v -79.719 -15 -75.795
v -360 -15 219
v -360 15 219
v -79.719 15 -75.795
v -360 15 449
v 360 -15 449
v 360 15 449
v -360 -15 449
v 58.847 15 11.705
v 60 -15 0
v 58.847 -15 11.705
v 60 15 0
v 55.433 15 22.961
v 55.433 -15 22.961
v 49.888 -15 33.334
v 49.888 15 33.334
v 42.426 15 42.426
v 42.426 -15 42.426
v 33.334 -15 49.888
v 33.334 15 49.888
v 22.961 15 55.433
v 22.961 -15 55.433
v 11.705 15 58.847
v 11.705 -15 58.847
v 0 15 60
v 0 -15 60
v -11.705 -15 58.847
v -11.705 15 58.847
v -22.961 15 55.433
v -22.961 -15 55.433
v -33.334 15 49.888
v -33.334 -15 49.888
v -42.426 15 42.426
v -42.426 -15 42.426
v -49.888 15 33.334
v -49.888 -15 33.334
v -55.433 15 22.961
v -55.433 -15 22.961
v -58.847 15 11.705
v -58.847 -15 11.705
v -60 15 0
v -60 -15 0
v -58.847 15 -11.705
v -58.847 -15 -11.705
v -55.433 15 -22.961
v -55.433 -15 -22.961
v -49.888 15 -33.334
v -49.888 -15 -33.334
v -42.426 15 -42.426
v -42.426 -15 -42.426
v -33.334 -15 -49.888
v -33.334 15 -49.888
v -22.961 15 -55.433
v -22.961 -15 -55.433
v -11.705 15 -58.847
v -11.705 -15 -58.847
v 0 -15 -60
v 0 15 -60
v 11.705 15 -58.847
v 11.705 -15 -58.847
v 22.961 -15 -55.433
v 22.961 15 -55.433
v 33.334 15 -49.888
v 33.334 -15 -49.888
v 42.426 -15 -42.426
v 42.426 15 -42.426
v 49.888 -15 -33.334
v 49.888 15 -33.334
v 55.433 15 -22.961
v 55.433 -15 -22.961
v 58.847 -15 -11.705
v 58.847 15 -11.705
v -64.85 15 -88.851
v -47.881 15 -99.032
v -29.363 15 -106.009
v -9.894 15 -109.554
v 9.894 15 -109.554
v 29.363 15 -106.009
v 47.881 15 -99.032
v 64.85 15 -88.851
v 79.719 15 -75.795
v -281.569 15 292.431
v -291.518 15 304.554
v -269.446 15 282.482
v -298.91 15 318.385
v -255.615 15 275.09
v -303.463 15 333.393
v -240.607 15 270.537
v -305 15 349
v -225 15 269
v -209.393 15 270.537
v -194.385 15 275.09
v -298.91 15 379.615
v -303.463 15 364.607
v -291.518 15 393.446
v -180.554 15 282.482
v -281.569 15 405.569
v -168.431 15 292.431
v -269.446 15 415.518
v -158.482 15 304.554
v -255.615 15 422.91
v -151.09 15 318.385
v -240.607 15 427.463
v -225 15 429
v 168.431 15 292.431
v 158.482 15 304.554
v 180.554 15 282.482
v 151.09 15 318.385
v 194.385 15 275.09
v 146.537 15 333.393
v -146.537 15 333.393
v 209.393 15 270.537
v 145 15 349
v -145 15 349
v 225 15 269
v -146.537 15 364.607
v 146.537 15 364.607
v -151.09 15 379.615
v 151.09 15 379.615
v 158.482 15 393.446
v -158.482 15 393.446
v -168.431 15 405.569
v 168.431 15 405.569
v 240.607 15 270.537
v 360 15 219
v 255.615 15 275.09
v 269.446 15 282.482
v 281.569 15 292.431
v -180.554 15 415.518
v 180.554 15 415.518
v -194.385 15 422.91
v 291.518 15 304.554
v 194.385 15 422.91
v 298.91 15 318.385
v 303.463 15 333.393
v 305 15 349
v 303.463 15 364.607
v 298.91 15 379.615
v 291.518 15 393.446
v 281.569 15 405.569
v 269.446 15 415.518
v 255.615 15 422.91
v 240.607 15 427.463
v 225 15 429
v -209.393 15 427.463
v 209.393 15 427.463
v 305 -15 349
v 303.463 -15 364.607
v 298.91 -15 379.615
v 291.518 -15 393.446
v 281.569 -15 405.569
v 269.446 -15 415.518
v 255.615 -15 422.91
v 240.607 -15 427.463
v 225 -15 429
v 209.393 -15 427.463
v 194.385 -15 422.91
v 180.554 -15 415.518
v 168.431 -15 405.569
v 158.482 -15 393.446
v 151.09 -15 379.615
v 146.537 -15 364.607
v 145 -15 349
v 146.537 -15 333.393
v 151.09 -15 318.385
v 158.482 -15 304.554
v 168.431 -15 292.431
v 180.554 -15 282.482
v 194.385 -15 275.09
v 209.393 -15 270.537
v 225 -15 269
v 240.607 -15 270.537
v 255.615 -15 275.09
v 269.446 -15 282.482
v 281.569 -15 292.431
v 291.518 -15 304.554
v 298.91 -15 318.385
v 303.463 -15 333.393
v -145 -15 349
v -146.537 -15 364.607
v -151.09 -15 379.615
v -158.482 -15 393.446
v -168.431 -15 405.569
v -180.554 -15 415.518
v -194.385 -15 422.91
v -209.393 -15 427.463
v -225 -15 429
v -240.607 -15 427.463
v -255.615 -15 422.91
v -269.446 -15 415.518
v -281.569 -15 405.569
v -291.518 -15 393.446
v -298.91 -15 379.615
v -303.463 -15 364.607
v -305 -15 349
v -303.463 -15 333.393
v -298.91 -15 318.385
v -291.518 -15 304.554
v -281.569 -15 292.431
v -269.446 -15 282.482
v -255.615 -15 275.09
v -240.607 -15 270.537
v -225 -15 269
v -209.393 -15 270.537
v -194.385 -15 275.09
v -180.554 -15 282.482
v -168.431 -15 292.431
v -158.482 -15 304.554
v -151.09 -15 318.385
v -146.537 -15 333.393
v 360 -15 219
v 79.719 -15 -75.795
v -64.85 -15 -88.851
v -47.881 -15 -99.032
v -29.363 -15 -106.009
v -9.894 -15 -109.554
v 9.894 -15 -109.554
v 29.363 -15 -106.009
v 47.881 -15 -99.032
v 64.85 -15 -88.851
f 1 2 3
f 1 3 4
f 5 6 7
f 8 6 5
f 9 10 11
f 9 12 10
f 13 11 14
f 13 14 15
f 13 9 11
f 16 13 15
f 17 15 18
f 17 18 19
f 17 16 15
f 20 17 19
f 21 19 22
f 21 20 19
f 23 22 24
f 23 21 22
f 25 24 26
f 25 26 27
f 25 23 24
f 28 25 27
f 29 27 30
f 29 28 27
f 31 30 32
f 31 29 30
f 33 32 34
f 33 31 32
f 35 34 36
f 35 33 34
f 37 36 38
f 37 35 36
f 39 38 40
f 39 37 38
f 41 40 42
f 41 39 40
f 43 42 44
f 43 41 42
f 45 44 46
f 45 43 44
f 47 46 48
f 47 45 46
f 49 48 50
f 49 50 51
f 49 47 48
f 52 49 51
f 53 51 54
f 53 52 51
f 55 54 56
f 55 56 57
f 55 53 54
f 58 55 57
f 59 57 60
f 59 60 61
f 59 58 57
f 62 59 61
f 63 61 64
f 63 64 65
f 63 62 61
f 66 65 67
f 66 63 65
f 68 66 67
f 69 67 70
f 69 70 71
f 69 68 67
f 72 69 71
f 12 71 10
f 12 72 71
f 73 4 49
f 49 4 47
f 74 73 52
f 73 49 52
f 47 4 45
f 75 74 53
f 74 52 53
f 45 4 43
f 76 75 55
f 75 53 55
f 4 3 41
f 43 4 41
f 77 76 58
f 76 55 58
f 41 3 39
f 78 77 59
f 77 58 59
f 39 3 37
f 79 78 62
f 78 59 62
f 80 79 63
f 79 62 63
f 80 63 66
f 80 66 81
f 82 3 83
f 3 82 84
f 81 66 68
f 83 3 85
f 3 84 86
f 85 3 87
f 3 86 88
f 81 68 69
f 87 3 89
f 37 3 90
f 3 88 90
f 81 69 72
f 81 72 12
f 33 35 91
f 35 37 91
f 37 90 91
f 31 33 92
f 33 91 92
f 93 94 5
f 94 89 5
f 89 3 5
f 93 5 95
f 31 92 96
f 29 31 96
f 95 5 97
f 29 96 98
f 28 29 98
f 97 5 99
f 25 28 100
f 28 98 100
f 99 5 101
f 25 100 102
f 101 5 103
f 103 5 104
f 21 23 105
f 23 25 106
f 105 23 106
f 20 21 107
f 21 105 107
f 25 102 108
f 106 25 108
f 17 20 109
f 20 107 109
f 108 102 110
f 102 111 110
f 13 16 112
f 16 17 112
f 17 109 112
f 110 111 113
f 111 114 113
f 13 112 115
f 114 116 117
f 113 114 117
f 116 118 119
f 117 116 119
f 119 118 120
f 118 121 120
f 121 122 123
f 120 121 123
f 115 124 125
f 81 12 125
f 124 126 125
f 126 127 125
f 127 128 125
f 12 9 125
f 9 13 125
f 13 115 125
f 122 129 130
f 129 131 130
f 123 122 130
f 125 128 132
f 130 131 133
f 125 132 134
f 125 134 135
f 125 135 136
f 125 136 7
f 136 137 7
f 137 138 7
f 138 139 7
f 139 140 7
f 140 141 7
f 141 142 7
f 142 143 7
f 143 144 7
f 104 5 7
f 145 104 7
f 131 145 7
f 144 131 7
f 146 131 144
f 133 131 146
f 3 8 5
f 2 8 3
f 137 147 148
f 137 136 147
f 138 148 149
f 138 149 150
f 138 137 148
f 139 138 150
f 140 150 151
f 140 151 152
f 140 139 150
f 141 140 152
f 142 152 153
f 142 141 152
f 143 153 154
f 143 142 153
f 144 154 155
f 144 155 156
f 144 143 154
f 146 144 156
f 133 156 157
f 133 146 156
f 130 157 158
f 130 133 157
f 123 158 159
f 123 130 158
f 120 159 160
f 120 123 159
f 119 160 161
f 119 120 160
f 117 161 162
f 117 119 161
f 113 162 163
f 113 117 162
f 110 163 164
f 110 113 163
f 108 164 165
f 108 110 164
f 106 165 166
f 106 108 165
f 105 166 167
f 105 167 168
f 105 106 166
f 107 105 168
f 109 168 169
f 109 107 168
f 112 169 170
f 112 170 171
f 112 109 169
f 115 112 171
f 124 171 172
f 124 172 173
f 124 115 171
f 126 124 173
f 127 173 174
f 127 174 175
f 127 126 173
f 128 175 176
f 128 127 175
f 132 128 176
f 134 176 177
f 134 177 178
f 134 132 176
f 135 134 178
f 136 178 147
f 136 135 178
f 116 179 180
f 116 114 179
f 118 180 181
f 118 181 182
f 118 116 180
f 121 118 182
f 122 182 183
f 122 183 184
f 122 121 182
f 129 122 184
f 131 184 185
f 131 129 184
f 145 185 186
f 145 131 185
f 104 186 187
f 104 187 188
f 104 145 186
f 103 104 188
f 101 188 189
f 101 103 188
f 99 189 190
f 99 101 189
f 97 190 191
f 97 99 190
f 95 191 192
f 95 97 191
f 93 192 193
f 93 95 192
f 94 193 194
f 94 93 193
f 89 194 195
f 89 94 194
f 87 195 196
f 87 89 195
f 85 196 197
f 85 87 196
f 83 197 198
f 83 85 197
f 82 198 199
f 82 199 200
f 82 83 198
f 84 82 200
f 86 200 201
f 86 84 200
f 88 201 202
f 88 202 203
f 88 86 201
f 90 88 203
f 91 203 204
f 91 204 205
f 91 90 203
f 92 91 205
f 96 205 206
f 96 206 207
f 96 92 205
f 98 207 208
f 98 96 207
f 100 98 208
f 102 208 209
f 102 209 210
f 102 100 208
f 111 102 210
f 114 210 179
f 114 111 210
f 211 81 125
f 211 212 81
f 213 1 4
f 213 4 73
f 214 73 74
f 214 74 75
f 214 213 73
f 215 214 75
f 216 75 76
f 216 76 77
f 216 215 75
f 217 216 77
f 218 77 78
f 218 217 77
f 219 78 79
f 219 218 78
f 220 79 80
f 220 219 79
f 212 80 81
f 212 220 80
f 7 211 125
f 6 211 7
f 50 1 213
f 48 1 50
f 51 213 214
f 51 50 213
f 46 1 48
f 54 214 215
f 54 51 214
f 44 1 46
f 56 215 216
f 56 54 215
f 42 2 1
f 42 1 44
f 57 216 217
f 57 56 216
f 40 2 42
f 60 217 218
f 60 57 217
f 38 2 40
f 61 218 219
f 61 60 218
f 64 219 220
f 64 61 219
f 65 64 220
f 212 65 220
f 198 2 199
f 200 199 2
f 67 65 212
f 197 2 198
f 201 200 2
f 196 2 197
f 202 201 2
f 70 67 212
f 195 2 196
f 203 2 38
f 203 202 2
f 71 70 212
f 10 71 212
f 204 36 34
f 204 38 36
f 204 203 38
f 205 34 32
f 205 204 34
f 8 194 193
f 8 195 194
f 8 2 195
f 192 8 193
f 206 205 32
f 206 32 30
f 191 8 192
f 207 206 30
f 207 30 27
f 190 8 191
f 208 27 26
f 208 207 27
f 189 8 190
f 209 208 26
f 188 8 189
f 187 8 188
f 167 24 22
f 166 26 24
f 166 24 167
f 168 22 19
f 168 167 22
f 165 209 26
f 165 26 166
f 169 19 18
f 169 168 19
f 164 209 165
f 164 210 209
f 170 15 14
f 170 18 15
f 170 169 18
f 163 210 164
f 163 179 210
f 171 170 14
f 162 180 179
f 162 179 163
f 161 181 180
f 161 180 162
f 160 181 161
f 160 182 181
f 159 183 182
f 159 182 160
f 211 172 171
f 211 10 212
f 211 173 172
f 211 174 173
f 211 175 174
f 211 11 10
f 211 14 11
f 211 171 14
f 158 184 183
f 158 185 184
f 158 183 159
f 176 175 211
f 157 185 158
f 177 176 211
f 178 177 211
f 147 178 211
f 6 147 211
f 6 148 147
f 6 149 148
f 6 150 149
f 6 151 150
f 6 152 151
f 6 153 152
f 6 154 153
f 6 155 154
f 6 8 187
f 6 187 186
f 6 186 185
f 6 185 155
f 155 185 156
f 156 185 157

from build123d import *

# Parameters (mm, degrees)
F0_R     = 60
F0_R_2   = 80
F1_DEPTH = 15


with BuildPart() as f1:
    # F0 (on Front) → F1 (new body, symmetric)
    with BuildSketch(Plane.XZ):
        with BuildLine():
            Line((360, 449), (-360, 449))
            Line((-360, 449), (-360, 219))
            Line((-360, 219), (-79.719446, -75.794524))
            ThreePointArc((-79.719446, -75.794524), (0, -110), (79.719446, -75.794524))
            Line((79.719446, -75.794524), (360, 219))
            Line((360, 219), (360, 449))
        make_face()
        Circle(F0_R, mode=Mode.SUBTRACT)
        with Locations((-225, 349)):
            Circle(F0_R_2, mode=Mode.SUBTRACT)
        with Locations((225, 349)):
            Circle(F0_R_2, mode=Mode.SUBTRACT)
    extrude(amount=F1_DEPTH, both=True)


solid = f1.part
